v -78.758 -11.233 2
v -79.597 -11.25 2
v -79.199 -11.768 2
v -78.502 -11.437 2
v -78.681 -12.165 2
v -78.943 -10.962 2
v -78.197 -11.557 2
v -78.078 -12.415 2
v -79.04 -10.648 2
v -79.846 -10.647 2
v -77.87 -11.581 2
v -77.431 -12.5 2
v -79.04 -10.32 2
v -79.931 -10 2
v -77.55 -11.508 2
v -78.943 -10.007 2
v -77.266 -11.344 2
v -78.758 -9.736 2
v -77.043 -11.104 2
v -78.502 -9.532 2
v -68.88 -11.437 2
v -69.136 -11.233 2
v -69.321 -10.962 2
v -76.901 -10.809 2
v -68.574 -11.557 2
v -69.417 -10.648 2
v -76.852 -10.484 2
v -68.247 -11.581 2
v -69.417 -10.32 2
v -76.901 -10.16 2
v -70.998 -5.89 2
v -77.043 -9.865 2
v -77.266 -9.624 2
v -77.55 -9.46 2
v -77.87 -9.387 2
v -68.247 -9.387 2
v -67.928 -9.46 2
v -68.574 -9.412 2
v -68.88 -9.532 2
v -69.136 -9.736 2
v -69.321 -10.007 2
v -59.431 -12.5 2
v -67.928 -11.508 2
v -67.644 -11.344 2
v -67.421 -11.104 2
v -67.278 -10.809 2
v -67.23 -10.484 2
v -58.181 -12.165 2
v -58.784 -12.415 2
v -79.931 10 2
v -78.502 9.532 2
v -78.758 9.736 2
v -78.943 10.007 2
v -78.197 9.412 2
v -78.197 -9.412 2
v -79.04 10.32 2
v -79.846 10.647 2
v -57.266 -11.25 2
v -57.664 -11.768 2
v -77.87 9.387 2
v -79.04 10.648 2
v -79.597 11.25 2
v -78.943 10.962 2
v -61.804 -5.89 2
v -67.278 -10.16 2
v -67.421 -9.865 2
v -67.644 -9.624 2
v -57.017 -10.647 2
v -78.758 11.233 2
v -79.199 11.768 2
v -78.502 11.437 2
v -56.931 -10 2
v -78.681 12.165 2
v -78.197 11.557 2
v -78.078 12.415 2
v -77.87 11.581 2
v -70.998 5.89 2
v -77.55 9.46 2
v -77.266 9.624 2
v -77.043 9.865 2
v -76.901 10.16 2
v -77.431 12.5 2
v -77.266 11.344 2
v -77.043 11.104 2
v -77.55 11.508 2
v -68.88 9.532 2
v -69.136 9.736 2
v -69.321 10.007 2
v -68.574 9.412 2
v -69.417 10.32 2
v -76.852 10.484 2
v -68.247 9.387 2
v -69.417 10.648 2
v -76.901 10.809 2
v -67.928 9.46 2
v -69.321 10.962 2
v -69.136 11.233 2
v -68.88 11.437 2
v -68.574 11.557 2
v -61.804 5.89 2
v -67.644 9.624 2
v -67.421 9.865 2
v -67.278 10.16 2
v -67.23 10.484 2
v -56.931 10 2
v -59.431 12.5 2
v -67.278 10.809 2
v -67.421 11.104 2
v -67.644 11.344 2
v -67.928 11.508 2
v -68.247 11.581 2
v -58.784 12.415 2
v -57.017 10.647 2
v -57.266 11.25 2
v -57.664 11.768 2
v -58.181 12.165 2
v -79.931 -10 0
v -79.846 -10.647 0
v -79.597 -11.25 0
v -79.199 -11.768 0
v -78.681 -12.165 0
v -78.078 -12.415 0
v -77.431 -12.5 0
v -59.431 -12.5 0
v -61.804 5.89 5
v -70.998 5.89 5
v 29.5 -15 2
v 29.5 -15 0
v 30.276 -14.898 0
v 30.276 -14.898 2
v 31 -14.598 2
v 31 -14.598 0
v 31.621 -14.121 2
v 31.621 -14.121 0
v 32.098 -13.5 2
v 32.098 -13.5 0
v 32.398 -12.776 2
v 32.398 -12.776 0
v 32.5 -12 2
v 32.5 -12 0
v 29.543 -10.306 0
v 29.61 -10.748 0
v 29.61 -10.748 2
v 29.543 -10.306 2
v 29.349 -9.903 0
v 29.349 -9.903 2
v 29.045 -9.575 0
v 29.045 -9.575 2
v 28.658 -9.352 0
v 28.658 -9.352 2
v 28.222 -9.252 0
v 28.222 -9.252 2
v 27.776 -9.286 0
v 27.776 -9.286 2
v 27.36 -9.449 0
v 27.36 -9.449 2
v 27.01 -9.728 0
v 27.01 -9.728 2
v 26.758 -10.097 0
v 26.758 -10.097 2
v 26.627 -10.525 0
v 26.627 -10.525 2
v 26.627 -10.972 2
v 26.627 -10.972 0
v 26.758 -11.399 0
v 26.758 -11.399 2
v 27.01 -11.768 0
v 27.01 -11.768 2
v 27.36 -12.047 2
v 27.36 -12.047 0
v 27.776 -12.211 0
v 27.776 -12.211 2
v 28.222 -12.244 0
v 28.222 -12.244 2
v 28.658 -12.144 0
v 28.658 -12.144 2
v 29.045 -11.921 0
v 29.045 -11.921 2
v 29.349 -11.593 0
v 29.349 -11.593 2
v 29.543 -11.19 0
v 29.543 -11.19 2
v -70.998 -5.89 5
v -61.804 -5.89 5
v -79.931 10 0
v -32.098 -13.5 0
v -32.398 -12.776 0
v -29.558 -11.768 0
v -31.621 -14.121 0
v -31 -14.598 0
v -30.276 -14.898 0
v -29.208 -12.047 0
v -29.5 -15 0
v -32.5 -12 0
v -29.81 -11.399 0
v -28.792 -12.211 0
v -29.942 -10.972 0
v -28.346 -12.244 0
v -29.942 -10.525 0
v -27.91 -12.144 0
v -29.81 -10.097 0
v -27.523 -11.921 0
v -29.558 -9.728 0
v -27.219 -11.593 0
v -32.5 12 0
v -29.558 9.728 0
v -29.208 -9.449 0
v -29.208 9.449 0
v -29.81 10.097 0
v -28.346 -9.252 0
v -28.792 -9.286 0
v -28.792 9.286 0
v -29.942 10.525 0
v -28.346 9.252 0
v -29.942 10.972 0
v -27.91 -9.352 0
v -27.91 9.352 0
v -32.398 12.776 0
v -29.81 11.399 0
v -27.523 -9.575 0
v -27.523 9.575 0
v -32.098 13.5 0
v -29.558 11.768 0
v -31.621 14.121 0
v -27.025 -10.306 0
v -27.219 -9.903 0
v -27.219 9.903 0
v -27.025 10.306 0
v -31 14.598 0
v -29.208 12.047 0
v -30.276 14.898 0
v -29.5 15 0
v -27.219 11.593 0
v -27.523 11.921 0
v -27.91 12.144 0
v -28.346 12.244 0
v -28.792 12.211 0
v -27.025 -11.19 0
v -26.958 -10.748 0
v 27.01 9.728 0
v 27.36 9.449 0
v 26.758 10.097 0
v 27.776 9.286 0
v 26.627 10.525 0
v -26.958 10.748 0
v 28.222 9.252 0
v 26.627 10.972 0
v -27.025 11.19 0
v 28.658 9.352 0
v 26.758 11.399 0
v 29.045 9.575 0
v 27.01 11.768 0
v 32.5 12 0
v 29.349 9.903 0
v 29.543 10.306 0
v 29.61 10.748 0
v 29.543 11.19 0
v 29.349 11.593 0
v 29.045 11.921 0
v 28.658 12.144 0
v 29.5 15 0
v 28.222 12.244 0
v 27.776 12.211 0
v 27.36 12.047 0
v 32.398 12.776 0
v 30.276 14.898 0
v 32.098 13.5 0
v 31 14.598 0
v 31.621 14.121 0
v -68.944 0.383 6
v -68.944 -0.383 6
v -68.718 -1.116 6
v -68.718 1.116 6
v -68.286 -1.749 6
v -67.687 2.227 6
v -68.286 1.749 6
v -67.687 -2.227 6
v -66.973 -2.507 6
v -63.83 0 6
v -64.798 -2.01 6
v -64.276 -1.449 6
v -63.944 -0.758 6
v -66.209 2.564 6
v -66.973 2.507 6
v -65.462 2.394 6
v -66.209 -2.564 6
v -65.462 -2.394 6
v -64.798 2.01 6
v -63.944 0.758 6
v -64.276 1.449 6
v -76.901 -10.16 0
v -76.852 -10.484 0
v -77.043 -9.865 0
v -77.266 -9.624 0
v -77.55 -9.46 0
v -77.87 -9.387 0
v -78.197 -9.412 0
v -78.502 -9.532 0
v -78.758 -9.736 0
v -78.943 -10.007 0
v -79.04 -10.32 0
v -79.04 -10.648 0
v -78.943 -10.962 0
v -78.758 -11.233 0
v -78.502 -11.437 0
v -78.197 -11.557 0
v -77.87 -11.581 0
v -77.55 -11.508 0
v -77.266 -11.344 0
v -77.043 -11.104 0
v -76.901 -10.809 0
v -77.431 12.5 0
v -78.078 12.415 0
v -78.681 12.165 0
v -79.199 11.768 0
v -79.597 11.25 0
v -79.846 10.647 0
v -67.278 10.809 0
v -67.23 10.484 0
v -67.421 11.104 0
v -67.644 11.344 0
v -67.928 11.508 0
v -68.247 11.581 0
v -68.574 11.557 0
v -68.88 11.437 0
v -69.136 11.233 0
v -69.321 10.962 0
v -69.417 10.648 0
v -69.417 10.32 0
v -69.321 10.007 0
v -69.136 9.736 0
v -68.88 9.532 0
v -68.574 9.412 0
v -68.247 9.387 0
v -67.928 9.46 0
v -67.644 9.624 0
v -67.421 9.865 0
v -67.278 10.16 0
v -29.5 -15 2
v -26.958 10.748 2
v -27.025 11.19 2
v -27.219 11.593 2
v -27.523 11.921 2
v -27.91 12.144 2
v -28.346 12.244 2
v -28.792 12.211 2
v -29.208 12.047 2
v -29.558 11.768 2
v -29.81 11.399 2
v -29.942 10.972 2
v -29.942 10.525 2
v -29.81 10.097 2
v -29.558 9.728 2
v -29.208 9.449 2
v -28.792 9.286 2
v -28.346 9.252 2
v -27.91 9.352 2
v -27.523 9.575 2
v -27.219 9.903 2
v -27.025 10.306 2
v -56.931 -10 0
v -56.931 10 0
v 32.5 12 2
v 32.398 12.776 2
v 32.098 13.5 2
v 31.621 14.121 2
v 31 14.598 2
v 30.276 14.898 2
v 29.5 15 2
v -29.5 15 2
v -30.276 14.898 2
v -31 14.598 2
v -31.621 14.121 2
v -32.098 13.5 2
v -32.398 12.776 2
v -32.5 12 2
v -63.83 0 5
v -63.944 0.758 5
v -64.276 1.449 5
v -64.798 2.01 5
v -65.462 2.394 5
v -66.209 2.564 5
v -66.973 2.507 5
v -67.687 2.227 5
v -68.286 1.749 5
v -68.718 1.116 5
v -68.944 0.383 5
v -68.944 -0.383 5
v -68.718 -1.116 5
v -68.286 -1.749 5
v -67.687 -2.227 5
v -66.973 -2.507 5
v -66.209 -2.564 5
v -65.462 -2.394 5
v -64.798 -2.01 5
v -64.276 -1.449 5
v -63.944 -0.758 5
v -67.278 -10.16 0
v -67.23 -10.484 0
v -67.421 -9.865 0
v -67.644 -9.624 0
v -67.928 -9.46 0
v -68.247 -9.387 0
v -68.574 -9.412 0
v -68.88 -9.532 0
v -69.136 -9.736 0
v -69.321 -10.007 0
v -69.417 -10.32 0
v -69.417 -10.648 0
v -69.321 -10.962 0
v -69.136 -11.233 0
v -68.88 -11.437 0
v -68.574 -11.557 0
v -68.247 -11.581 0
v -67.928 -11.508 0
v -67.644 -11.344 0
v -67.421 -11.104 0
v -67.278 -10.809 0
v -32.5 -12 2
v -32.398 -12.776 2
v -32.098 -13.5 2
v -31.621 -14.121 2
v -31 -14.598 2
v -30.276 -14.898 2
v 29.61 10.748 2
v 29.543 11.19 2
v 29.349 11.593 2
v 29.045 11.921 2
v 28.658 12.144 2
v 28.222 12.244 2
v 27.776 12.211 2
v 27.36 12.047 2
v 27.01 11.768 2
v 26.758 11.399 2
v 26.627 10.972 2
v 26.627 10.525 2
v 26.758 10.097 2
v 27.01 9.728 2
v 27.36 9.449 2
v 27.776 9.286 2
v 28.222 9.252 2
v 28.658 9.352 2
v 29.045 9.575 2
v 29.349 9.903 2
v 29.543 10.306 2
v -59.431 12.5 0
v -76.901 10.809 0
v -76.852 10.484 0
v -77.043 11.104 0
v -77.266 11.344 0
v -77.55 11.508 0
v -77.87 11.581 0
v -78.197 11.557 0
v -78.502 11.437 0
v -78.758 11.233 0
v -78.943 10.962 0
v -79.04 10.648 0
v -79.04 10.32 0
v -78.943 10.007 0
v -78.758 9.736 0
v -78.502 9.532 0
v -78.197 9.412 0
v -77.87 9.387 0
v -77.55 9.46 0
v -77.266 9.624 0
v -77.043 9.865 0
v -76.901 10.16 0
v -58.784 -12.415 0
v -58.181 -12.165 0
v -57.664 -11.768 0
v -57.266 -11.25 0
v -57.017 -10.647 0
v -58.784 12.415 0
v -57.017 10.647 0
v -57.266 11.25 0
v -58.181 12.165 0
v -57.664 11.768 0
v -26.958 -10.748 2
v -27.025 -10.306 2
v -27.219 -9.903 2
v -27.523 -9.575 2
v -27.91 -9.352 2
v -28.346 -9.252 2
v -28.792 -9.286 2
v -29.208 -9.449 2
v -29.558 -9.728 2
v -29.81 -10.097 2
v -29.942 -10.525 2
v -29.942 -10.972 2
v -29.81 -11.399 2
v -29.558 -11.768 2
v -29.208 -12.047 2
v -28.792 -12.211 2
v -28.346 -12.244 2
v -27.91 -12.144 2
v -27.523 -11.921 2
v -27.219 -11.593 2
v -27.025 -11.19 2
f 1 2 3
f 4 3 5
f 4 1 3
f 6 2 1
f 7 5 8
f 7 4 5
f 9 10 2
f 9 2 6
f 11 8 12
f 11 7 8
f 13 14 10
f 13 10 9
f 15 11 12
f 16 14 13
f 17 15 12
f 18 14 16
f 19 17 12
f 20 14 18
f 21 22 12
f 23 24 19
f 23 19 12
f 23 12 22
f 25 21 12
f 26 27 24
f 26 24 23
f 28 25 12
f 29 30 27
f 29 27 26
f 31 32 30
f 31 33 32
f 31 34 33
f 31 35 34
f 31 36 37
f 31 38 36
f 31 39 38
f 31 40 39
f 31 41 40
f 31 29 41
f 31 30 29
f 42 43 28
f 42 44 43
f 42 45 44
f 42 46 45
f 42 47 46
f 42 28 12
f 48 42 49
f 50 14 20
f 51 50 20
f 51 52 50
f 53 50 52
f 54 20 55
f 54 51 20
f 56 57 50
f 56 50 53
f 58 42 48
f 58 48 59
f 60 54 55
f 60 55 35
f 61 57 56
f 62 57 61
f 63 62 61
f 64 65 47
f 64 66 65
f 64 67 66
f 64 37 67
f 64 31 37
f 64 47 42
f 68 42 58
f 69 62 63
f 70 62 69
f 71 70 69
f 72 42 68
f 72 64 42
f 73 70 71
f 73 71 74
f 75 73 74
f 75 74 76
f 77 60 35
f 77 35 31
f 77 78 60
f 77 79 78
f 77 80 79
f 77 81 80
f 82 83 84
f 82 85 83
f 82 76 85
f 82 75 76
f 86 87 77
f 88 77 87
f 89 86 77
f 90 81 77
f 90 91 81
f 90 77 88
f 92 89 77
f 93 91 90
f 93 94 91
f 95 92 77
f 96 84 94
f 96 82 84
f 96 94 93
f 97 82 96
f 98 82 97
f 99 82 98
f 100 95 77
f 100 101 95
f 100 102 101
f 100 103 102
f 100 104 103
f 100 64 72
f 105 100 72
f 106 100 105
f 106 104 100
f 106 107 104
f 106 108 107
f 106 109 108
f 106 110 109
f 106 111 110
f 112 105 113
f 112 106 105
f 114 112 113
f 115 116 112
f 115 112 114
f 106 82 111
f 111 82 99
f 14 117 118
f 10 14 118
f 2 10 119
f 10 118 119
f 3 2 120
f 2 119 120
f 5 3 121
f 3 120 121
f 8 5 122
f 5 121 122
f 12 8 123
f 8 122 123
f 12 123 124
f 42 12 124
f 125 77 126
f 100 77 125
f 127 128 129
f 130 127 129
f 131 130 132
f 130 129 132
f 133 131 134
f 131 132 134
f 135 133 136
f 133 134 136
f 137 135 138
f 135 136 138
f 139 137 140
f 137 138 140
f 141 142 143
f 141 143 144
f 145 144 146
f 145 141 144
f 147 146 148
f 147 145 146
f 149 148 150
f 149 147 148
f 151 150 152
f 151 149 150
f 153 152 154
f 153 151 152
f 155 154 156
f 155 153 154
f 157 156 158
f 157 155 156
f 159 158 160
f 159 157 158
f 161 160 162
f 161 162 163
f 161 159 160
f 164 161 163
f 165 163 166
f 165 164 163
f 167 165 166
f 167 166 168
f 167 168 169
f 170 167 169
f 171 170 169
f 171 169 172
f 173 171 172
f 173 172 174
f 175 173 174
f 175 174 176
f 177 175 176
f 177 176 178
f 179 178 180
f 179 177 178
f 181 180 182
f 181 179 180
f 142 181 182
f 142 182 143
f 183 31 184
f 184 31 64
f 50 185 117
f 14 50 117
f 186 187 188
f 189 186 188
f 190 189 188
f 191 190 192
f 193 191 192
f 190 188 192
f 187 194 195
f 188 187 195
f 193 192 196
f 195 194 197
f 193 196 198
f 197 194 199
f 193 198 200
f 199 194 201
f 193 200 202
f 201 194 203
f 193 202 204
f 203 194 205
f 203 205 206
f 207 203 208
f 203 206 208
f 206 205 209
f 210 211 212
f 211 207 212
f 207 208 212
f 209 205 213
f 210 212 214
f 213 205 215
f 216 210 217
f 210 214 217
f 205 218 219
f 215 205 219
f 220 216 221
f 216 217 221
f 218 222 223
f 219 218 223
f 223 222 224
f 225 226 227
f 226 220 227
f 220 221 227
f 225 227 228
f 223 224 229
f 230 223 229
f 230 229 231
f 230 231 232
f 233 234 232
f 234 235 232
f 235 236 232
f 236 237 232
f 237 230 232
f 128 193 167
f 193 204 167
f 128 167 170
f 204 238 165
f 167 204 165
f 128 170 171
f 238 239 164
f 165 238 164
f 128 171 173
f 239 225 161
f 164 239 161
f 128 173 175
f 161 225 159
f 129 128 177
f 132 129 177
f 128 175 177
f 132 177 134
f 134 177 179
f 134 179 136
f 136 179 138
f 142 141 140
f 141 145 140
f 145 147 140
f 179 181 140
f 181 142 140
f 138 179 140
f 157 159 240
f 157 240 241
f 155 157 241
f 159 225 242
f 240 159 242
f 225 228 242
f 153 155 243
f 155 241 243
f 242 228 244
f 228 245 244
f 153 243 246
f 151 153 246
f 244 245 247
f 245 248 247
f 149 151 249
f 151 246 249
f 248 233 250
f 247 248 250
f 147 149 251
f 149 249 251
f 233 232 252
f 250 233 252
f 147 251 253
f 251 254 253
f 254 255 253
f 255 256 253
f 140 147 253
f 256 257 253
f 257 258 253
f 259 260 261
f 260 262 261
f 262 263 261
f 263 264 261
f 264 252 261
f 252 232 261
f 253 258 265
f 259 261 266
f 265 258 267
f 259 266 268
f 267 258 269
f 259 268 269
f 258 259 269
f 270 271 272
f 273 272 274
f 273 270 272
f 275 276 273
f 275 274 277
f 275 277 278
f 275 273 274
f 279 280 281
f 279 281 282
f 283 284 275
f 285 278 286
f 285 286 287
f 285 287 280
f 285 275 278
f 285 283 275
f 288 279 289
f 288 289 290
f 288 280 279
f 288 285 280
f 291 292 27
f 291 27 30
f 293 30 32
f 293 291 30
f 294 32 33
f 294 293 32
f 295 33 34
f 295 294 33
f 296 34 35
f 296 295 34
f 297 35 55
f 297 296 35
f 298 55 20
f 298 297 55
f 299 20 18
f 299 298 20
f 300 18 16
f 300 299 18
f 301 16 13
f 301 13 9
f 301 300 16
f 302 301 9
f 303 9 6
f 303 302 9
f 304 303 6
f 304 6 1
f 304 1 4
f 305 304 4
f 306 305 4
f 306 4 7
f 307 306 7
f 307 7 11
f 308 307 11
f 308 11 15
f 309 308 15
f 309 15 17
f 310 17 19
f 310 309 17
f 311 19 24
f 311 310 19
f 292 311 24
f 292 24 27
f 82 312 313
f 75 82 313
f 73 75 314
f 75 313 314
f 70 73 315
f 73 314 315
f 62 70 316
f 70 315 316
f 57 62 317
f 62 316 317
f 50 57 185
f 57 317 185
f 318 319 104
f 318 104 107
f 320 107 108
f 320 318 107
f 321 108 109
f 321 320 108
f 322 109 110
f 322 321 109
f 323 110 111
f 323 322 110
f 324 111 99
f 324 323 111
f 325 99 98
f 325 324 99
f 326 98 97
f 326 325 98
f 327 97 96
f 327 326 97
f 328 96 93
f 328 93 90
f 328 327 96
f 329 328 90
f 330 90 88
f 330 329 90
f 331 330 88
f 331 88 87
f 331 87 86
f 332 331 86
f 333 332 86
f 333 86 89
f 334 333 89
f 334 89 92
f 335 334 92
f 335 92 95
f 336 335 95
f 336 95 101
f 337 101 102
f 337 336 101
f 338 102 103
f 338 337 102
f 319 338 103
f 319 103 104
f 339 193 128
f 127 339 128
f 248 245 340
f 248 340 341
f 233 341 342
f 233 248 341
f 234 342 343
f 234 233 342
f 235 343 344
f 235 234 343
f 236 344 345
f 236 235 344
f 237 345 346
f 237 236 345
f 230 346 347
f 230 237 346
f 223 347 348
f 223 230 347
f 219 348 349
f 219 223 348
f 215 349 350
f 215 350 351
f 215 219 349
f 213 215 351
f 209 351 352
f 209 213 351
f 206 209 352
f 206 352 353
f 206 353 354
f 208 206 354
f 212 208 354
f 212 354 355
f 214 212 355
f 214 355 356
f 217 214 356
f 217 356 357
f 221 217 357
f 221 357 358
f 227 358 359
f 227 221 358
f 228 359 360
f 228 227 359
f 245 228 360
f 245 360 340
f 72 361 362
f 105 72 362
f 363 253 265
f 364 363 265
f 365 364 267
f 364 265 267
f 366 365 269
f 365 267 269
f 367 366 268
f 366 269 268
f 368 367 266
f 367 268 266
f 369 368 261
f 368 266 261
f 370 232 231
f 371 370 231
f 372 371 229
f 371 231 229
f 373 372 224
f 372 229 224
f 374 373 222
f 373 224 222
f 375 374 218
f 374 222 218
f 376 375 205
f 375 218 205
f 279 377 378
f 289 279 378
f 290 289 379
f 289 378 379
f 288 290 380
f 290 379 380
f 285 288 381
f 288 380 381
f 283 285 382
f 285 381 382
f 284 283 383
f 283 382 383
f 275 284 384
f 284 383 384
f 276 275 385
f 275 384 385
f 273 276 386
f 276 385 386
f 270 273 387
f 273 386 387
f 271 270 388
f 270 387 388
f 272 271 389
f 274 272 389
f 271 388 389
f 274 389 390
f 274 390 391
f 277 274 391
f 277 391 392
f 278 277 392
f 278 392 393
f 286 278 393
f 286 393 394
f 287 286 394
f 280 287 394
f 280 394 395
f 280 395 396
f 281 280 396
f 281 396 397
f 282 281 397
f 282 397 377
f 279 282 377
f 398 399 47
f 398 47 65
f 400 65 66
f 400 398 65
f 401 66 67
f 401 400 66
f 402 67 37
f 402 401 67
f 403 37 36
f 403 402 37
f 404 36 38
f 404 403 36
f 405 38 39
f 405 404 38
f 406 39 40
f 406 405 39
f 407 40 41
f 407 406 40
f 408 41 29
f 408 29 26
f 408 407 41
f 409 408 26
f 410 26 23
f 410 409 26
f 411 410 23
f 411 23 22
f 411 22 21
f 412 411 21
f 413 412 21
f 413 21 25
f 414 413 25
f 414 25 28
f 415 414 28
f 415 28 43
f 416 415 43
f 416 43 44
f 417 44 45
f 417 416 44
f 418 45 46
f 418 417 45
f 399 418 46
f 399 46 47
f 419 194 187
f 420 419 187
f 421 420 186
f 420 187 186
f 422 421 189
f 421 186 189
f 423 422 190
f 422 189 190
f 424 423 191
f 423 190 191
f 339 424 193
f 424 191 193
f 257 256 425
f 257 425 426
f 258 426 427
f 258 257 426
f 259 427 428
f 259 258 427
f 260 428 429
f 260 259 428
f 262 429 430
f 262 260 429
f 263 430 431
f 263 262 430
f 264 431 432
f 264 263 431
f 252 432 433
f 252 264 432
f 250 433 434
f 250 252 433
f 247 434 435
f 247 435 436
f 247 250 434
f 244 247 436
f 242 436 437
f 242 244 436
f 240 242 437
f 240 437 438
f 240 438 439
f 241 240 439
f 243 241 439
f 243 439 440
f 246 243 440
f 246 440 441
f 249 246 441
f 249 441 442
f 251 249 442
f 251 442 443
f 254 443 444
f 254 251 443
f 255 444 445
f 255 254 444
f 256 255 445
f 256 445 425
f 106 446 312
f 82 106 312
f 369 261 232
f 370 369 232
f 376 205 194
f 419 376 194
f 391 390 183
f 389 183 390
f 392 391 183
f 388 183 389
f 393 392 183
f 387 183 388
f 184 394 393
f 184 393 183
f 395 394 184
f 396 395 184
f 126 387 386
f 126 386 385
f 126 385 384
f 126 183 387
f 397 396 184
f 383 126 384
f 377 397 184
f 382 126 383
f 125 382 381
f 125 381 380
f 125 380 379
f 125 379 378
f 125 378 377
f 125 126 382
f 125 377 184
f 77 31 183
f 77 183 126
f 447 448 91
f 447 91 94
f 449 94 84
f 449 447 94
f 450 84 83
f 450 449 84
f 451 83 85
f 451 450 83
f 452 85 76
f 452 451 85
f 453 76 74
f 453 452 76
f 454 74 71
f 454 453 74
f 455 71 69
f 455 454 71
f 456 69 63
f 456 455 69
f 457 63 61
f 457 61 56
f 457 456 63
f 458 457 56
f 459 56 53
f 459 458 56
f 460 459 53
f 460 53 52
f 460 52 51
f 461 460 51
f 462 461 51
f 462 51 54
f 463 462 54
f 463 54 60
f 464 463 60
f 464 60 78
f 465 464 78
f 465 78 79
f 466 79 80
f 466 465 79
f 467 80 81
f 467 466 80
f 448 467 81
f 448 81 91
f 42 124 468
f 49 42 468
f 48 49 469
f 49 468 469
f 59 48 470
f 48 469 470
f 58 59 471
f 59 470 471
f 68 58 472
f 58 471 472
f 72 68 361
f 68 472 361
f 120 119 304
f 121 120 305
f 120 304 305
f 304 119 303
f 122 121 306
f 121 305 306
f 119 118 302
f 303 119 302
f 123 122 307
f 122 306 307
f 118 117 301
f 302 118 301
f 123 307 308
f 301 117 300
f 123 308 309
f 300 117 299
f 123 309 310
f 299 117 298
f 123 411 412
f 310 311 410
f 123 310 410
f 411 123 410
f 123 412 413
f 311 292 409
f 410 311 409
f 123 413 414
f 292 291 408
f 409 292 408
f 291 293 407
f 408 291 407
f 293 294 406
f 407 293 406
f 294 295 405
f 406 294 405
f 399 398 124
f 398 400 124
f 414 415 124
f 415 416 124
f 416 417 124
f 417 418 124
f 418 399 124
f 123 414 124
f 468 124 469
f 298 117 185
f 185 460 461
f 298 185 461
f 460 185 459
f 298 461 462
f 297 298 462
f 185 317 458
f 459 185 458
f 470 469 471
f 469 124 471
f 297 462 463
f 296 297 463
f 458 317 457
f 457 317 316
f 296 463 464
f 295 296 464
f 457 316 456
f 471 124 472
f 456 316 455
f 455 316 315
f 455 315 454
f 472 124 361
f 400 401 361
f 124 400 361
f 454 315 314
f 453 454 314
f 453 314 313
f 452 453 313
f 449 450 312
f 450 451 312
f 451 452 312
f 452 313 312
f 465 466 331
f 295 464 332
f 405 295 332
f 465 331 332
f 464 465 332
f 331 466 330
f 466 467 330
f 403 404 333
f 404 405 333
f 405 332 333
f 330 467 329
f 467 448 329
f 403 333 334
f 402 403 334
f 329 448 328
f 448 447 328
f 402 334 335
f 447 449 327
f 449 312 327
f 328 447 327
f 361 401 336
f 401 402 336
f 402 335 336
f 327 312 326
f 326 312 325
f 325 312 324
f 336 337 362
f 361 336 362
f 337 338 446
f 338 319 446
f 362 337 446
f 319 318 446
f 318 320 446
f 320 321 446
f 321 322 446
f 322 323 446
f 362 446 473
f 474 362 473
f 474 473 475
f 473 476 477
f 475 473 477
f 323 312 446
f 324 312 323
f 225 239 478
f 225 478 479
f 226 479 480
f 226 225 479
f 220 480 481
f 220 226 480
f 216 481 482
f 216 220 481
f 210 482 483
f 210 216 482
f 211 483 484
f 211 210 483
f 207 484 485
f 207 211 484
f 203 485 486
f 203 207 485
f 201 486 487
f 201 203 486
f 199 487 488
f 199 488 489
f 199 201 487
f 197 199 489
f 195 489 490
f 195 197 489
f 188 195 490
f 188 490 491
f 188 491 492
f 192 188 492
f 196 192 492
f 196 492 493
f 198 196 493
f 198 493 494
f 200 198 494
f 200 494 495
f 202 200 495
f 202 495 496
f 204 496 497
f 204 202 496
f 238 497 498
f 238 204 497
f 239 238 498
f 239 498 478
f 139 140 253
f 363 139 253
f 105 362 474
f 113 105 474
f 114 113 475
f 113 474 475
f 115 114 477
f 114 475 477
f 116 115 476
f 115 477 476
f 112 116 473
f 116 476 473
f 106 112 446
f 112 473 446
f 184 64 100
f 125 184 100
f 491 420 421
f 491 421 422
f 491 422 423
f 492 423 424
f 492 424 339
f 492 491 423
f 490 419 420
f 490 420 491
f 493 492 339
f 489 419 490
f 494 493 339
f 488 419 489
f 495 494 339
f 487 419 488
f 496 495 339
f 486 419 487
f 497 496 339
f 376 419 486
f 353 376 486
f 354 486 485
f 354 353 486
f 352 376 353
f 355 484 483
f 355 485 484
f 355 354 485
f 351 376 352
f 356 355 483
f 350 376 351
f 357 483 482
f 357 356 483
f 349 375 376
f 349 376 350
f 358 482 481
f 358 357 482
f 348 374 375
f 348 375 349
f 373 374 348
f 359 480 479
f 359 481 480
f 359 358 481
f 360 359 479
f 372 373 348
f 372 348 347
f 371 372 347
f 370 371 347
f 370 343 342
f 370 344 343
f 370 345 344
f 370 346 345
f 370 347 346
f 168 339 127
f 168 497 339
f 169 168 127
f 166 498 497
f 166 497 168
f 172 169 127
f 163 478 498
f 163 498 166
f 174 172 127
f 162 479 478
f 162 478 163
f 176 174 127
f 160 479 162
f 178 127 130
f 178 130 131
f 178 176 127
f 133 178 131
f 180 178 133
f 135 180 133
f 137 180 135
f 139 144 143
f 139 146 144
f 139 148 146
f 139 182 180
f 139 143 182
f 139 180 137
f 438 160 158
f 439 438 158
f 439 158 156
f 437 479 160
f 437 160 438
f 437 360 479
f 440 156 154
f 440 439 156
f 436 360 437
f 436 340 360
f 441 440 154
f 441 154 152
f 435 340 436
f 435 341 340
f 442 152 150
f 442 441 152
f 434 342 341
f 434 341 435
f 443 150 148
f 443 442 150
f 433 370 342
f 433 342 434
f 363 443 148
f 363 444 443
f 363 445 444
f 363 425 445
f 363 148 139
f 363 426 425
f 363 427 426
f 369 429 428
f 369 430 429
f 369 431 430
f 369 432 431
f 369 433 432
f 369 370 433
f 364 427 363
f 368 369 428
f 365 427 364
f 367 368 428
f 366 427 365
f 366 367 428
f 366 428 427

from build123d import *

# Parameters (mm, degrees)
F0_R     = 1.5
F1_DEPTH = 2
F2_R     = 1.1
F2_W     = 9.193212
F2_H     = 11.779058
F2_R_2   = 2.571397
F3_DEPTH = 2
F4_DEPTH = 5
F5_DEPTH = 6


with BuildPart() as f1:
    # F0 (on Top) → F1 (new body)
    with BuildSketch(Plane.XY):
        with BuildLine():
            Line((29.5, 15), (-29.5, 15))
            ThreePointArc((-29.5, 15), (-31.62132, 14.12132), (-32.5, 12))
            Line((-32.5, 12), (-32.5, -12))
            ThreePointArc((-32.5, -12), (-31.62132, -14.12132), (-29.5, -15))
            Line((-29.5, -15), (29.5, -15))
            ThreePointArc((29.5, -15), (31.62132, -14.12132), (32.5, -12))
            Line((32.5, -12), (32.5, 12))
            ThreePointArc((32.5, 12), (31.62132, 14.12132), (29.5, 15))
        make_face()
        with Locations((-28.458294, -10.74818)):
            Circle(F0_R, mode=Mode.SUBTRACT)
        with Locations((28.109893, -10.74818)):
            Circle(F0_R, mode=Mode.SUBTRACT)
        with Locations((-28.458294, 10.748181)):
            Circle(F0_R, mode=Mode.SUBTRACT)
        with Locations((28.109893, 10.748181)):
            Circle(F0_R, mode=Mode.SUBTRACT)
    extrude(amount=F1_DEPTH)


with BuildPart() as f3:
    # F2 (on Top) → F3 (new body)
    with BuildSketch(Plane.XY):
        with BuildLine():
            Line((-59.431438, 12.5), (-77.431438, 12.5))
            ThreePointArc((-77.431438, 12.5), (-79.199205, 11.767767), (-79.931438, 10))
            Line((-79.931438, 10), (-79.931438, -10))
            ThreePointArc((-79.931438, -10), (-79.199205, -11.767767), (-77.431438, -12.5))
            Line((-77.431438, -12.5), (-59.431438, -12.5))
            ThreePointArc((-59.431438, -12.5), (-57.663671, -11.767767), (-56.931438, -10))
            Line((-56.931438, -10), (-56.931438, 10))
            ThreePointArc((-56.931438, 10), (-57.663671, 11.767767), (-59.431438, 12.5))
        make_face()
        with Locations((-77.951849, -10.484321)):
            Circle(F2_R, mode=Mode.SUBTRACT)
        with Locations((-68.329528, -10.484321)):
            Circle(F2_R, mode=Mode.SUBTRACT)
        with Locations((-77.951849, 10.484321)):
            Circle(F2_R, mode=Mode.SUBTRACT)
        with Locations((-66.400975, 0)):
            Rectangle(F2_W, F2_H, mode=Mode.SUBTRACT)
        with Locations((-68.329528, 10.484321)):
            Circle(F2_R, mode=Mode.SUBTRACT)
        with Locations((-66.400975, 0)):
            Rectangle(F2_W, F2_H)
        with Locations((-66.400975, 0)):
            Circle(F2_R_2, mode=Mode.SUBTRACT)
        with Locations((-66.400975, 0)):
            Circle(F2_R_2)
    extrude(amount=F3_DEPTH)

    # F2 (on Top) → F4 (join)
    with BuildSketch(Plane.XY):
        with Locations((-66.400975, 0)):
            Rectangle(F2_W, F2_H)
        with Locations((-66.400975, 0)):
            Circle(F2_R_2, mode=Mode.SUBTRACT)
        with Locations((-66.400975, 0)):
            Circle(F2_R_2)
    extrude(amount=F4_DEPTH)

    # F2 (on Top) → F5 (join)
    with BuildSketch(Plane.XY):
        with Locations((-66.400975, 0)):
            Circle(F2_R_2)
    extrude(amount=F5_DEPTH)


solid = Compound([f1.part, f3.part])
